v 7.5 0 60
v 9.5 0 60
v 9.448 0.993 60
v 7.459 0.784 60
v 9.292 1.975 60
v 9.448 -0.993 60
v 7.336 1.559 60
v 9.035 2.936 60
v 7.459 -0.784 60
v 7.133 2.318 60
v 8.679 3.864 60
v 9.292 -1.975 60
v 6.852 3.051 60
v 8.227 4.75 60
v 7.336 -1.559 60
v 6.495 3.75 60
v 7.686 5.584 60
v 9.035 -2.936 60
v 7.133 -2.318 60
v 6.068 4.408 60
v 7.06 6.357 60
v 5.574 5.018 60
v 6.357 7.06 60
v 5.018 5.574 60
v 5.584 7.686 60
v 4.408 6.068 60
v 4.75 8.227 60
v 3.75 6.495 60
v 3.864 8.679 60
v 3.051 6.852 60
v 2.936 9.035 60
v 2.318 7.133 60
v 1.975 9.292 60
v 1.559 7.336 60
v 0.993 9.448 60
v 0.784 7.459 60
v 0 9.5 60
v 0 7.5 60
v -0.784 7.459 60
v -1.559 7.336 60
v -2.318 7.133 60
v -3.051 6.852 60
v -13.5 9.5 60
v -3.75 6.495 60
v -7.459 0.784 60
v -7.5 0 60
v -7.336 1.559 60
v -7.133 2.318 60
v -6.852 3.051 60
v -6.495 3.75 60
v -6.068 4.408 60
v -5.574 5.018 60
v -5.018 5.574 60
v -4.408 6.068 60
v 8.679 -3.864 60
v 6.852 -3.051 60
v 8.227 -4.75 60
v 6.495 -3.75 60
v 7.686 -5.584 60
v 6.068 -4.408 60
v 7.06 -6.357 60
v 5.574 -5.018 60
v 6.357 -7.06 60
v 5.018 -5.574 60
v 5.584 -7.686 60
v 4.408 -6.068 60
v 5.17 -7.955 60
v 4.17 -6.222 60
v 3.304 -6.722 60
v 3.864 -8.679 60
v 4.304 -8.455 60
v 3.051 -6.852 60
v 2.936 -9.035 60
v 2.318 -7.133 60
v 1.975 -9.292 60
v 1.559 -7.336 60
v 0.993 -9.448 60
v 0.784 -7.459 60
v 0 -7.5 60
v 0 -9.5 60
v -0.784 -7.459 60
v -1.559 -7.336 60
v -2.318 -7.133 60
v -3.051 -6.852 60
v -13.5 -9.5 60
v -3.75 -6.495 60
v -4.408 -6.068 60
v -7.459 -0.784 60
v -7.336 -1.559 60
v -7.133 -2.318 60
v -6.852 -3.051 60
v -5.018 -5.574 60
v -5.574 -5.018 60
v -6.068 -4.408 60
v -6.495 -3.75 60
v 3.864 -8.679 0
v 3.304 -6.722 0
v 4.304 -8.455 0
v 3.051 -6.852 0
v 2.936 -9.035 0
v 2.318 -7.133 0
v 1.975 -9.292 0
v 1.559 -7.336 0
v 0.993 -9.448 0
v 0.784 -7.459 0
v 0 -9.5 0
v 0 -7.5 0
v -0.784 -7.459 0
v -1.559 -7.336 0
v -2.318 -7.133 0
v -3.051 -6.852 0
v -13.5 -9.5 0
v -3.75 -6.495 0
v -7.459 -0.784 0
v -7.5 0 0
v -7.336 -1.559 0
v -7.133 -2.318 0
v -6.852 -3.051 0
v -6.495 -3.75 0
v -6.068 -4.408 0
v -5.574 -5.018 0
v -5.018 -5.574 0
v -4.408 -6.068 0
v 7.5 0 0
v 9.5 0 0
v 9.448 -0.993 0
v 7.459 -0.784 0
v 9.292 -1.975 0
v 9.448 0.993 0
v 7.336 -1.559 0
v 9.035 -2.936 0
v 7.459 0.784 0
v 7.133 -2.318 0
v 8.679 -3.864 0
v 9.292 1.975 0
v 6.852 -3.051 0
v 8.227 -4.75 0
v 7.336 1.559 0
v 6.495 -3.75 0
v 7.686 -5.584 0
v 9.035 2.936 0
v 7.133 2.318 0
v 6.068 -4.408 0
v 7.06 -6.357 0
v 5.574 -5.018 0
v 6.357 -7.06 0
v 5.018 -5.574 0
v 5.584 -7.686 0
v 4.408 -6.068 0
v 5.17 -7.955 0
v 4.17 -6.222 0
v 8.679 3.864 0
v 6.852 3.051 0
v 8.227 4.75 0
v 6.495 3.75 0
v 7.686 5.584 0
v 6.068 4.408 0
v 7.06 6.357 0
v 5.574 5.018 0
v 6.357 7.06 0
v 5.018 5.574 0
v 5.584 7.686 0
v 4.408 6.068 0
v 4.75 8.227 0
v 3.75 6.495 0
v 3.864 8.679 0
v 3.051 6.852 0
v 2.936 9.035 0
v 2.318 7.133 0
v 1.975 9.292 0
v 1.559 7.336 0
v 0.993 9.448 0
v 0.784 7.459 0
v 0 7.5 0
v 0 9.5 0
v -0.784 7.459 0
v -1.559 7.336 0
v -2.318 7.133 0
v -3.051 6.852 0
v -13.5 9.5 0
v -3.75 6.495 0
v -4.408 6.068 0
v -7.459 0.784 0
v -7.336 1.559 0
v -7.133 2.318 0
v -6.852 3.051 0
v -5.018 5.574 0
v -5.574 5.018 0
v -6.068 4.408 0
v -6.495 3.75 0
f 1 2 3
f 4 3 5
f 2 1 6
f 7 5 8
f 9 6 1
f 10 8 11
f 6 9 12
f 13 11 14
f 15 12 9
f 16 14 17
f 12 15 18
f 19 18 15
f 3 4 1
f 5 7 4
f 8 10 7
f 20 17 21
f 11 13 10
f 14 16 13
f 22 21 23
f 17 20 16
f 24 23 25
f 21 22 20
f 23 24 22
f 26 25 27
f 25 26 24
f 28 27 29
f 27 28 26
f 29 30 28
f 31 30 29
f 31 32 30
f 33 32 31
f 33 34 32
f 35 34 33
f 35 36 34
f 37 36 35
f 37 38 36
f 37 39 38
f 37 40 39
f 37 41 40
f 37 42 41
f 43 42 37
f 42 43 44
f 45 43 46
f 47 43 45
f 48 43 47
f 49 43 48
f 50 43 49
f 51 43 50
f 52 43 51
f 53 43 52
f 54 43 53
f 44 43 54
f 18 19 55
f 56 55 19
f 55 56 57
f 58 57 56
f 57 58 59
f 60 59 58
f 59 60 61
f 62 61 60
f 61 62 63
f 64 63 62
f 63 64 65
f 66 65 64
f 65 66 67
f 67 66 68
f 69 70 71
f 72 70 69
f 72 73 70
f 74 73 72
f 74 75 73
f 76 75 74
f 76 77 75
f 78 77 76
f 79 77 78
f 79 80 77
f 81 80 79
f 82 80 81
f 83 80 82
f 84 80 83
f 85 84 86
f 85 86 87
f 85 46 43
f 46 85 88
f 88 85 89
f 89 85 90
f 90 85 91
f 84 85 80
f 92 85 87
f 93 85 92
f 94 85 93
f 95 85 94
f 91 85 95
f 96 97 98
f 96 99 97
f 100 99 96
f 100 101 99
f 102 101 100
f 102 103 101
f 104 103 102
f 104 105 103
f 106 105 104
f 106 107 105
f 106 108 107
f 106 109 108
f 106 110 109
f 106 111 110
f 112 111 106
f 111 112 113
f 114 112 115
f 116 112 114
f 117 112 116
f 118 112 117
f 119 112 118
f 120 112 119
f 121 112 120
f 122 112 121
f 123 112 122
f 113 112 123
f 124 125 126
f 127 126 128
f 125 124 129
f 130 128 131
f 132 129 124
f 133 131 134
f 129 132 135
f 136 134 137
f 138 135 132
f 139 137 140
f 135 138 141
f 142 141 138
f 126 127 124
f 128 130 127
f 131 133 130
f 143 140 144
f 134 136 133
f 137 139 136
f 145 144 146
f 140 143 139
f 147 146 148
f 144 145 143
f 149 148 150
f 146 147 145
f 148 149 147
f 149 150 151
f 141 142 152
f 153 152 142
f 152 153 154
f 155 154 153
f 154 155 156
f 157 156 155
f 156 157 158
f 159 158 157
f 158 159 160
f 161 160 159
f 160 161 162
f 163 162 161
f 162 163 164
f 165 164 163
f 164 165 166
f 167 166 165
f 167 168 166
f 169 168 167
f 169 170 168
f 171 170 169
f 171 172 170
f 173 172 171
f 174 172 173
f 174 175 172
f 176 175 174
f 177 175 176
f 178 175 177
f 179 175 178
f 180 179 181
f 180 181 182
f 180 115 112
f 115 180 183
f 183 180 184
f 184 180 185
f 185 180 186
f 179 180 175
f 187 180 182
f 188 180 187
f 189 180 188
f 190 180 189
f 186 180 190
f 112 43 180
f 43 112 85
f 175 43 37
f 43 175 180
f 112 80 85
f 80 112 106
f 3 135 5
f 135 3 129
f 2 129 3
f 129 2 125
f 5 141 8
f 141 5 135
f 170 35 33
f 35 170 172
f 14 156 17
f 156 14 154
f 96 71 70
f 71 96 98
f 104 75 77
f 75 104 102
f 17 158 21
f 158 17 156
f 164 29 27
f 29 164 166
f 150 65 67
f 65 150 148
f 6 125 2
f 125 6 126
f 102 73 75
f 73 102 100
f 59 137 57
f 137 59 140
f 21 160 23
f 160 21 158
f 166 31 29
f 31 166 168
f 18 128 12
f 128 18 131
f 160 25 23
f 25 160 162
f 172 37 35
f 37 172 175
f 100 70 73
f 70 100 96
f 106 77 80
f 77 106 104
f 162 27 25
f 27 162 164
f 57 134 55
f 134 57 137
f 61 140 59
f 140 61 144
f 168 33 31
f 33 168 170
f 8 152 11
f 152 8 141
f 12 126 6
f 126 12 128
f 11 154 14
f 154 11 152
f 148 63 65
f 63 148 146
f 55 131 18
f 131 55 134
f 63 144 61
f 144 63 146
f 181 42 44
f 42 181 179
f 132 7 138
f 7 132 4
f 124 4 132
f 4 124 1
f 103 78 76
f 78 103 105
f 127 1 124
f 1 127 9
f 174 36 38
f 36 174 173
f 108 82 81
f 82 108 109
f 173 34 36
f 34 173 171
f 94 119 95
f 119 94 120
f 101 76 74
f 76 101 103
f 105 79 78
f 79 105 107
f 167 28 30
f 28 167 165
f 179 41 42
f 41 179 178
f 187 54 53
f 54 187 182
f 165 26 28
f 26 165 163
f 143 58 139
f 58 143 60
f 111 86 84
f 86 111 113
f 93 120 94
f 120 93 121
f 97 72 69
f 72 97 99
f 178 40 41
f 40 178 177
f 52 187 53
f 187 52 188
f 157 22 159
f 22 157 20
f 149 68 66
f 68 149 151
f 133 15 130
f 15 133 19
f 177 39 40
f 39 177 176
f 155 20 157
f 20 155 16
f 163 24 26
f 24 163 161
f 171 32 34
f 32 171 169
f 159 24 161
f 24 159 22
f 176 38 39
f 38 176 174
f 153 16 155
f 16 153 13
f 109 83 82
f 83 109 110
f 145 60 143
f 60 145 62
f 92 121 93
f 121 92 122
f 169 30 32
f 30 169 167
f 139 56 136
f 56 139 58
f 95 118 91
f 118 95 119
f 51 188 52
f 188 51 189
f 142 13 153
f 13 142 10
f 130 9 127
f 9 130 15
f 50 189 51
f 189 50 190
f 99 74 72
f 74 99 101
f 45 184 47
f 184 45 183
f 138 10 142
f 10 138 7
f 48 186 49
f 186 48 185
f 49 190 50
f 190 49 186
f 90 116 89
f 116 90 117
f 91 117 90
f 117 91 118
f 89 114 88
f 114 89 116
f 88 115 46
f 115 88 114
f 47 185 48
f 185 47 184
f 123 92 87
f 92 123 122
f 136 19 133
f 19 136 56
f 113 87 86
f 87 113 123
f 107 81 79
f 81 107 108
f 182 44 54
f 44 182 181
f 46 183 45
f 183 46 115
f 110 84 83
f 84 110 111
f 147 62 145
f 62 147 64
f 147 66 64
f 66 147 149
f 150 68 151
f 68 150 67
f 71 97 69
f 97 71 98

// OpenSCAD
// PRUSA iteration3
// Bearing holders
// GNU GPL v3
// Josef Průša <iam@josefprusa.cz> and contributors
// http://www.reprap.org/wiki/Prusa_Mendel
// http://prusamendel.org

bearing_diameter = 15;

module horizontal_bearing_base(bearings=1){
 translate(v=[0,0,6]) cube(size = [24,8+bearings*25,12], center = true);	
}

module horizontal_bearing_base_bis(bearings=1){
	difference()
	{
		translate(v=[0,0,6]) cube(size = [24,8+bearings*25,12], center = true);	
		translate(v=[24/2,0,12]) rotate([0,45,0]) cube(size = [5,8+bearings*25 + 2,5], center = true);	
		translate(v=[-24/2,0,12]) rotate([0,-45,0]) cube(size = [5,8+bearings*25 + 2,5], center = true);	
	}
}

module horizontal_bearing_holes(bearings=1){
 cutter_lenght = 10+bearings*25;
 one_holder_lenght = 8+25;
 holder_lenght = 8+bearings*25;
 
 // Main bearing cut
 difference(){
  translate(v=[0,0,12+1.5]) rotate(a=[90,0,0]) translate(v=[0,0,-cutter_lenght/2]) cylinder(h = cutter_lenght, r=bearing_diameter/2, $fn=50);
  // Bearing retainers
  translate(v=[0,1-holder_lenght/2,3+1.5]) cube(size = [24,6,8], center = true);
  // addiing middle retainer
  translate(v=[0,0,3+1.5]) cube(size = [24,2,8], center = true);
  //
  translate(v=[0,-1+holder_lenght/2,3+1.5]) cube(size = [24,6,8], center = true);
 }
 
 // Ziptie cutouts
 ziptie_cut_ofset = 0;
 for ( i = [0 : bearings-1] ){
  // For easier positioning I move them by half of one 
  // bearing holder then add each bearign lenght and then center again
  translate(v=[0,-holder_lenght/2,0]) translate(v=[0,one_holder_lenght/2+i*25,0]) difference(){
   union(){
    translate(v=[0,2-6,12]) rotate(a=[90,0,0]) translate(v=[0,0,0]) cylinder(h = 4, r=12.5, $fn=50);
    translate(v=[0,2+6,12]) rotate(a=[90,0,0]) translate(v=[0,0,0]) cylinder(h = 4, r=12.5, $fn=50);
   }
   translate(v=[0,10,12]) rotate(a=[90,0,0]) translate(v=[0,0,0]) cylinder(h = 24, r=10, $fn=50);
  }
 }
 
}

module horizontal_bearing_test(){
 difference(){
  horizontal_bearing_base(1);
  horizontal_bearing_holes(1);
 }
 translate(v=[30,0,0]) difference(){
  horizontal_bearing_base(2);
  horizontal_bearing_holes(2);
 }
 translate(v=[60,0,0]) difference(){
  horizontal_bearing_base(3);
  horizontal_bearing_holes(3);
 }
}



thinwall = 2;
bearing_size = bearing_diameter + 2 * thinwall;

module vertical_bearing_base(){
 translate(v=[-2-bearing_size/4,0,30]) cube(size = [4+bearing_size/2,bearing_size,60], center = true);
 cylinder(h = 60, r=bearing_size/2, $fn = 60);
}

module vertical_bearing_holes(){
  translate(v=[0,0,-1]) cylinder(h = 62, r=bearing_diameter/2, $fn = 60);
  rotate(a=[0,0,-60]) translate(v=[10,0,31]) cube(size = [10,1,62], center = true);
}

difference(){
vertical_bearing_base();
vertical_bearing_holes();
}
